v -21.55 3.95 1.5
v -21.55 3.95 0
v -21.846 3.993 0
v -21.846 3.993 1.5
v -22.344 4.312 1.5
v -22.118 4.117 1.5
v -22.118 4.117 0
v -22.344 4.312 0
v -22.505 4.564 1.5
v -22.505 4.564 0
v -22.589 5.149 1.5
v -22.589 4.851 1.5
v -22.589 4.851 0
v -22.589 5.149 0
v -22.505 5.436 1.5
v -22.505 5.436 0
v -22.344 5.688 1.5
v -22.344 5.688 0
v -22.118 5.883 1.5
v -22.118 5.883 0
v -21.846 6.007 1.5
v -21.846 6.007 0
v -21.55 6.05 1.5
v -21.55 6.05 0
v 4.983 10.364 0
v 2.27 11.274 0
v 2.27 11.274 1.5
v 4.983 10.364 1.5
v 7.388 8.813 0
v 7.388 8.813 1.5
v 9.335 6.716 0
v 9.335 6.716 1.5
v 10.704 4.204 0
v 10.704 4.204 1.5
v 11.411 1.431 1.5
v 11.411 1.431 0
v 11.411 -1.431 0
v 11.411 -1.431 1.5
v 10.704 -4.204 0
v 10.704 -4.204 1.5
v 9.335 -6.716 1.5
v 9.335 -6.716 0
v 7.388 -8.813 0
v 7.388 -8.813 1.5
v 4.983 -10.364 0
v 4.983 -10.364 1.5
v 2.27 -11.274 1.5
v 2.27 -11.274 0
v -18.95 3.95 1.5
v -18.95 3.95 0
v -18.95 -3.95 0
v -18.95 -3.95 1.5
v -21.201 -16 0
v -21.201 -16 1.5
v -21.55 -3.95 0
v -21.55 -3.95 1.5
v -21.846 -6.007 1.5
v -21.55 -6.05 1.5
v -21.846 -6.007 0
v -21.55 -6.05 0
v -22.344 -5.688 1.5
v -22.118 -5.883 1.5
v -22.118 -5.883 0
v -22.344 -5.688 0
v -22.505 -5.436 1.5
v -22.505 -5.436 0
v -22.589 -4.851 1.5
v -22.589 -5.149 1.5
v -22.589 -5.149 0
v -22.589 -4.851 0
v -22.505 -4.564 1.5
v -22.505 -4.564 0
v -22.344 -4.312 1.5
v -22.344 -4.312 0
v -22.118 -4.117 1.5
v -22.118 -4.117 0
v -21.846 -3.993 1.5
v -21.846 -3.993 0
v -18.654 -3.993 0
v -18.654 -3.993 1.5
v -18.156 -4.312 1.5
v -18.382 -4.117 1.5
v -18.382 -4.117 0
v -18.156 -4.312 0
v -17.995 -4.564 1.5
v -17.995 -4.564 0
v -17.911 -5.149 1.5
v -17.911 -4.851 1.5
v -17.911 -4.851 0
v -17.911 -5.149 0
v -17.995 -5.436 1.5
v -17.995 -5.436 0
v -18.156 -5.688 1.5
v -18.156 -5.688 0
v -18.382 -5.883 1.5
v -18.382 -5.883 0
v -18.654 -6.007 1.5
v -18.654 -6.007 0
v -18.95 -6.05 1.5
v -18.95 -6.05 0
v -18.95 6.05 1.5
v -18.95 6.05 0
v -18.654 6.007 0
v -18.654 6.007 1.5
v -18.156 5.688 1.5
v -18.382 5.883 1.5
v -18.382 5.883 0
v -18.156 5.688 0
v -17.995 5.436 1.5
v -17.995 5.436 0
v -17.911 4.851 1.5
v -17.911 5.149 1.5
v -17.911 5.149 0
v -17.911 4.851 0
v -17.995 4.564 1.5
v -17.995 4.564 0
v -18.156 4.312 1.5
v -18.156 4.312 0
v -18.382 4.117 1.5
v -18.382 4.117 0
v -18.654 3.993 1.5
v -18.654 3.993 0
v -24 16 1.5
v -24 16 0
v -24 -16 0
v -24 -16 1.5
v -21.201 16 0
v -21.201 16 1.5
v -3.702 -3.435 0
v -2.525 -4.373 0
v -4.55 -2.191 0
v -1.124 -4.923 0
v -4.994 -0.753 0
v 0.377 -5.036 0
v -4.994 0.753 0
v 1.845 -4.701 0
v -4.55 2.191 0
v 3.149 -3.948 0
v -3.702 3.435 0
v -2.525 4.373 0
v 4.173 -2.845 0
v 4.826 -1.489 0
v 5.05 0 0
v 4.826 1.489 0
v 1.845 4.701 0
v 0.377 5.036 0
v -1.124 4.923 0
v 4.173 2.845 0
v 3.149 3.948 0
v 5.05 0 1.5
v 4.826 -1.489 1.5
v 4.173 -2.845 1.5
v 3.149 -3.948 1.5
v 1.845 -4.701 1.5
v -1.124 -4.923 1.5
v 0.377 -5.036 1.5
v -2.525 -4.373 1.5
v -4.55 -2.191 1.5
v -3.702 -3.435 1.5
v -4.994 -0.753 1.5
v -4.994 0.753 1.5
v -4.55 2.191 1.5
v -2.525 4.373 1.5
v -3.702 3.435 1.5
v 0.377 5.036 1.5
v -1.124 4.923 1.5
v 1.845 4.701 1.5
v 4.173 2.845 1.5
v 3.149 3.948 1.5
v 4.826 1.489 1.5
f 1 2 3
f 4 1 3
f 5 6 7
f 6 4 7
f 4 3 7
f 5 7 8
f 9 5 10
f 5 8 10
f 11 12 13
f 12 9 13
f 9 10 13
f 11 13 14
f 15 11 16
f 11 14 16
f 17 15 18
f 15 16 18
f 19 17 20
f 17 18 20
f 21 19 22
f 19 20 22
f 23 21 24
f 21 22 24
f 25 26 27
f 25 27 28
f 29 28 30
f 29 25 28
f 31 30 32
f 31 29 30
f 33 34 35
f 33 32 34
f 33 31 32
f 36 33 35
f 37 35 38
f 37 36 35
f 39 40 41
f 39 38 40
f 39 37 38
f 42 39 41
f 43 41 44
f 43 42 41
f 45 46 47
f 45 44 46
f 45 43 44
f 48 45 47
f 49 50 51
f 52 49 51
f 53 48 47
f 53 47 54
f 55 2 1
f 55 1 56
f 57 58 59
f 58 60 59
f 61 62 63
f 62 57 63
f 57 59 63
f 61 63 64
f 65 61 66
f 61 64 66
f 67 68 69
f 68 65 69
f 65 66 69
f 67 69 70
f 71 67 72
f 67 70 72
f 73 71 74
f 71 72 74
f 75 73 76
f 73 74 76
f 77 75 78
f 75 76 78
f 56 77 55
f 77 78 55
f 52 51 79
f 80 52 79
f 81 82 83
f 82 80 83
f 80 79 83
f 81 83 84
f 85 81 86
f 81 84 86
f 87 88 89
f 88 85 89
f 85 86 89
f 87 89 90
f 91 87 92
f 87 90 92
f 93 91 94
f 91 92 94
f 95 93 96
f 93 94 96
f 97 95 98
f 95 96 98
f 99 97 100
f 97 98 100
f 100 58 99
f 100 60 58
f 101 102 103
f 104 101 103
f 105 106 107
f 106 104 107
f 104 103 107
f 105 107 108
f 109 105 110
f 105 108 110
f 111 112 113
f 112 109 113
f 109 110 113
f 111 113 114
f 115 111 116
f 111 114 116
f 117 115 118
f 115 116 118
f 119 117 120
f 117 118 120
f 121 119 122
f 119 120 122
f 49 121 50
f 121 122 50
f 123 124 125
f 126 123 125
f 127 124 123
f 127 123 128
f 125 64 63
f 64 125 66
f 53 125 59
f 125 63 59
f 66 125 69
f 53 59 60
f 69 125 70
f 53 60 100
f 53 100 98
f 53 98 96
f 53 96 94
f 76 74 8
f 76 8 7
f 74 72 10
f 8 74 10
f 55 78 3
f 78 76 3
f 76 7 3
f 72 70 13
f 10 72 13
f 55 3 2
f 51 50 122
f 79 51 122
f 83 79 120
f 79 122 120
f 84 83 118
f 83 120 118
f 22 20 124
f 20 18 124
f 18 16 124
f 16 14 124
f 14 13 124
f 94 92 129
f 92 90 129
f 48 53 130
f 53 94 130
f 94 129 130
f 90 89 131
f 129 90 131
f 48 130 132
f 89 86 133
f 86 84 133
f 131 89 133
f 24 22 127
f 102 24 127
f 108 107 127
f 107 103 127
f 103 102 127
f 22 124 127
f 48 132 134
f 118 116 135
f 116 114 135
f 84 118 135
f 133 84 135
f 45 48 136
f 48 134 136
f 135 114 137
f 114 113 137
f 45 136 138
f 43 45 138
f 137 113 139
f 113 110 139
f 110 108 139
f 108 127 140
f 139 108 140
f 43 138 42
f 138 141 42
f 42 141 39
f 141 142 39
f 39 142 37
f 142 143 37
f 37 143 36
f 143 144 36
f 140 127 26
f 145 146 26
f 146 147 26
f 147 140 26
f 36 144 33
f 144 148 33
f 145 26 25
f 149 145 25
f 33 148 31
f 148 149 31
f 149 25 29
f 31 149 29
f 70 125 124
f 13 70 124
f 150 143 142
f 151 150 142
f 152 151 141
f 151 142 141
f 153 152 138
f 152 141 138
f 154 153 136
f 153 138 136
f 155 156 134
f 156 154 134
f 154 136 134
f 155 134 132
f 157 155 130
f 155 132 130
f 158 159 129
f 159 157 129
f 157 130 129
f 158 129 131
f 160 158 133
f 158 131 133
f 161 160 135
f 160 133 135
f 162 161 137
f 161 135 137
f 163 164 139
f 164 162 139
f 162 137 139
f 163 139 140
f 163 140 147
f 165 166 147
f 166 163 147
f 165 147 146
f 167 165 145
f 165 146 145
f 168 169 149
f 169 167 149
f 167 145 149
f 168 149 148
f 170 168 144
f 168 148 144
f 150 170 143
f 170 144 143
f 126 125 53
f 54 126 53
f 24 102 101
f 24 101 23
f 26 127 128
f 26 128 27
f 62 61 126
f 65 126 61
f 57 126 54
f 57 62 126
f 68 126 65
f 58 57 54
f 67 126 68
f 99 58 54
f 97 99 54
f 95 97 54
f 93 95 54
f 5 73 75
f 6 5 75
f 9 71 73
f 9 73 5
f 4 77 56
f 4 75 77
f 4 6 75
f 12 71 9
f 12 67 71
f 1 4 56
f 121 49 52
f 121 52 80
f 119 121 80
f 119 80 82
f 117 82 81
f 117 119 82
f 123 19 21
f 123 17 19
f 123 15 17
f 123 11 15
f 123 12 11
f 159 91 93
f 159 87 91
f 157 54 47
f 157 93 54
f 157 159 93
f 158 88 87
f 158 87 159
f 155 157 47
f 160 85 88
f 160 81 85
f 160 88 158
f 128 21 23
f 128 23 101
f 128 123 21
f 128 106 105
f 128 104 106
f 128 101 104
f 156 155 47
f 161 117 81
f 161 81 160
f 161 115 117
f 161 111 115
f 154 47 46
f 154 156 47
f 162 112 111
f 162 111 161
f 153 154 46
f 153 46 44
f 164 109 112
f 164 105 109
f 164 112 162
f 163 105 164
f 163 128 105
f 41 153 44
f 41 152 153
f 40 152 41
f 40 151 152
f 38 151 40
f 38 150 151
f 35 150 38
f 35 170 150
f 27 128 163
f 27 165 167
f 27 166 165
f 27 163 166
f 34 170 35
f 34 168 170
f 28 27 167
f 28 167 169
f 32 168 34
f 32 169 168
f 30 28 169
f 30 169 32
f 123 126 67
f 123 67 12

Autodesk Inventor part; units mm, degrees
ref_plane "YZ Plane" through (0, 0, 0) normal (1, 0, 0) x (0, 1, 0)
ref_plane "XZ Plane" through (0, 0, 0) normal (0, 1, 0) x (-1, 0, 0)
ref_plane "XY Plane" through (0, 0, 0) normal (0, 0, 1) x (1, 0, 0)
sketch "スケッチ1" plane through (0, 0, 0) normal (0, 0, 1) x (1, 0, 0)
  circle A0 centre (0, 0) radius 10.5 construction
  line L0 (-12, 10.583) -> (-12, -10.583) construction
  arc A1 (0, 16) -> (-12, 10.583) centre (0, 0) ccw construction
  line L1 (0, 16) -> (33.5167, 16) construction
  line L2 (33.5167, 16) -> (33.5167, -16) construction
  line L3 (33.5167, -16) -> (0, -16) construction
  arc A2 (-12, -10.583) -> (0, -16) centre (0, 0) ccw construction
  circle A3 centre (0, 8.5) radius 1.35
  circle A4 centre (-8.5, 0) radius 1.35
  circle A5 centre (0, -8.5) radius 1.35
  circle A6 centre (8.5, 0) radius 1.35
  circle A7 centre (0, 0) radius 5.05
  circle A8 centre (0, 0) radius 16 construction
  line L4 (-21.5, 6) -> (-19, 6) construction
  line L5 (-19, 6) -> (-19, -6) construction
  line L6 (-19, -6) -> (-21.5, -6) construction
  line L7 (-21.5, -6) -> (-21.5, 6) construction
  circle A9 centre (0, 0) radius 19 construction
  line L8 (-18.95, 6.05) -> (-21.55, 6.05) construction
  line L9 (-21.55, 6.05) -> (-21.55, -6.05) construction
  line L10 (-21.55, -6.05) -> (-18.95, -6.05) construction
  line L11 (-18.95, -6.05) -> (-18.95, 6.05) construction
  circle A10 centre (-21.55, 5) radius 1.05 construction
  line L12 (-18.95, 6.05) -> (-21.55, 6.05)
  arc A11 (-21.55, 6.05) -> (-21.55, 3.95) centre (-21.55, 5) ccw
  line L13 (-21.55, 3.95) -> (-21.55, -3.95)
  line L14 (-20.25, 6.05) -> (-20.25, -6.05) construction
  line L15 (-21.55, 0) -> (-19, 0) construction
  arc A12 (-21.55, -3.95) -> (-21.55, -6.05) centre (-21.55, -5) ccw
  line L16 (-21.55, -6.05) -> (-18.95, -6.05)
  line L17 (-18.95, 3.95) -> (-18.95, -3.95)
  arc A13 (-18.95, 3.95) -> (-18.95, 6.05) centre (-18.95, 5) ccw
  arc A14 (-18.95, -6.05) -> (-18.95, -3.95) centre (-18.95, -5) ccw
  line L18 (-24, 6) -> (-24, -6)
  circle A15 centre (-21.5, 13) radius 1.55
  circle A16 centre (-21.5, -13) radius 1.55
  line L19 (-24, 16) -> (-21.201, 16)
  line L20 (-24, -16) -> (-21.201, -16)
  arc A17 (2.2701, -11.2737) -> (2.2701, 11.2737) centre (0, 0) ccw
  line L21 (-24, 16) -> (-24, 6)
  circle A18 centre (-21.5, 13) radius 3 construction
  line L22 (-24, -16) -> (-24, -6)
  line L23 (-21.201, 16) -> (2.2701, 11.2737)
  line L24 (2.2701, -11.2737) -> (-21.201, -16)
  point P0 (-12, 0)
  point P1 (-20.275, 0)
  dimension "d29" = 2.1
  dimension "d0" = 21
  dimension "d1" = 16
  dimension "d2" = 12
  dimension "d3" = 8.5
  dimension "d4" = 2.7
  dimension "d7" = 360
  dimension "d9" = 10.1
  dimension "d10" = 2.5
  dimension "d11" = 3
  dimension "d27" = 10
  dimension "d30" = 0.05
  dimension "d31" = 7
  dimension "d33" = 3.1
  dimension "d41" = 2.5
  dimension "d43" = 1
extrude "押し出し1" add sketch "スケッチ1" along normal blind 1.5
sketch "スケッチ2" plane through (0, 0, 0) normal (0, 0, -1) x (-1, 0, 0)
  circle A0 centre (0, -8.5) radius 1.35 projected
  circle A1 centre (0, -8.5) radius 1.35
  circle A2 centre (-8.5, 0) radius 1.35 projected
  circle A3 centre (-8.5, 0) radius 1.35
  circle A4 centre (8.5, 0) radius 1.35 projected
  circle A5 centre (8.5, 0) radius 1.35
  circle A6 centre (21.5, -13) radius 1.55 projected
  circle A7 centre (21.5, -13) radius 1.55
  circle A8 centre (0, 8.5) radius 1.35 projected
  circle A9 centre (0, 8.5) radius 1.35
  circle A10 centre (21.5, 13) radius 1.55 projected
  circle A11 centre (21.5, 13) radius 1.55
  point P0 (0, 0)
extrude "押し出し2" add sketch "スケッチ2" against normal up to surface (1.5 mm away)
equation "\"d27\" = d21"
equation "\"d31\" = d23"
equation "\"d21\" = 10"
equation "\"d23\" = 7"
properties part number "肩_サブフレーム_1_1" material "GFRP"
